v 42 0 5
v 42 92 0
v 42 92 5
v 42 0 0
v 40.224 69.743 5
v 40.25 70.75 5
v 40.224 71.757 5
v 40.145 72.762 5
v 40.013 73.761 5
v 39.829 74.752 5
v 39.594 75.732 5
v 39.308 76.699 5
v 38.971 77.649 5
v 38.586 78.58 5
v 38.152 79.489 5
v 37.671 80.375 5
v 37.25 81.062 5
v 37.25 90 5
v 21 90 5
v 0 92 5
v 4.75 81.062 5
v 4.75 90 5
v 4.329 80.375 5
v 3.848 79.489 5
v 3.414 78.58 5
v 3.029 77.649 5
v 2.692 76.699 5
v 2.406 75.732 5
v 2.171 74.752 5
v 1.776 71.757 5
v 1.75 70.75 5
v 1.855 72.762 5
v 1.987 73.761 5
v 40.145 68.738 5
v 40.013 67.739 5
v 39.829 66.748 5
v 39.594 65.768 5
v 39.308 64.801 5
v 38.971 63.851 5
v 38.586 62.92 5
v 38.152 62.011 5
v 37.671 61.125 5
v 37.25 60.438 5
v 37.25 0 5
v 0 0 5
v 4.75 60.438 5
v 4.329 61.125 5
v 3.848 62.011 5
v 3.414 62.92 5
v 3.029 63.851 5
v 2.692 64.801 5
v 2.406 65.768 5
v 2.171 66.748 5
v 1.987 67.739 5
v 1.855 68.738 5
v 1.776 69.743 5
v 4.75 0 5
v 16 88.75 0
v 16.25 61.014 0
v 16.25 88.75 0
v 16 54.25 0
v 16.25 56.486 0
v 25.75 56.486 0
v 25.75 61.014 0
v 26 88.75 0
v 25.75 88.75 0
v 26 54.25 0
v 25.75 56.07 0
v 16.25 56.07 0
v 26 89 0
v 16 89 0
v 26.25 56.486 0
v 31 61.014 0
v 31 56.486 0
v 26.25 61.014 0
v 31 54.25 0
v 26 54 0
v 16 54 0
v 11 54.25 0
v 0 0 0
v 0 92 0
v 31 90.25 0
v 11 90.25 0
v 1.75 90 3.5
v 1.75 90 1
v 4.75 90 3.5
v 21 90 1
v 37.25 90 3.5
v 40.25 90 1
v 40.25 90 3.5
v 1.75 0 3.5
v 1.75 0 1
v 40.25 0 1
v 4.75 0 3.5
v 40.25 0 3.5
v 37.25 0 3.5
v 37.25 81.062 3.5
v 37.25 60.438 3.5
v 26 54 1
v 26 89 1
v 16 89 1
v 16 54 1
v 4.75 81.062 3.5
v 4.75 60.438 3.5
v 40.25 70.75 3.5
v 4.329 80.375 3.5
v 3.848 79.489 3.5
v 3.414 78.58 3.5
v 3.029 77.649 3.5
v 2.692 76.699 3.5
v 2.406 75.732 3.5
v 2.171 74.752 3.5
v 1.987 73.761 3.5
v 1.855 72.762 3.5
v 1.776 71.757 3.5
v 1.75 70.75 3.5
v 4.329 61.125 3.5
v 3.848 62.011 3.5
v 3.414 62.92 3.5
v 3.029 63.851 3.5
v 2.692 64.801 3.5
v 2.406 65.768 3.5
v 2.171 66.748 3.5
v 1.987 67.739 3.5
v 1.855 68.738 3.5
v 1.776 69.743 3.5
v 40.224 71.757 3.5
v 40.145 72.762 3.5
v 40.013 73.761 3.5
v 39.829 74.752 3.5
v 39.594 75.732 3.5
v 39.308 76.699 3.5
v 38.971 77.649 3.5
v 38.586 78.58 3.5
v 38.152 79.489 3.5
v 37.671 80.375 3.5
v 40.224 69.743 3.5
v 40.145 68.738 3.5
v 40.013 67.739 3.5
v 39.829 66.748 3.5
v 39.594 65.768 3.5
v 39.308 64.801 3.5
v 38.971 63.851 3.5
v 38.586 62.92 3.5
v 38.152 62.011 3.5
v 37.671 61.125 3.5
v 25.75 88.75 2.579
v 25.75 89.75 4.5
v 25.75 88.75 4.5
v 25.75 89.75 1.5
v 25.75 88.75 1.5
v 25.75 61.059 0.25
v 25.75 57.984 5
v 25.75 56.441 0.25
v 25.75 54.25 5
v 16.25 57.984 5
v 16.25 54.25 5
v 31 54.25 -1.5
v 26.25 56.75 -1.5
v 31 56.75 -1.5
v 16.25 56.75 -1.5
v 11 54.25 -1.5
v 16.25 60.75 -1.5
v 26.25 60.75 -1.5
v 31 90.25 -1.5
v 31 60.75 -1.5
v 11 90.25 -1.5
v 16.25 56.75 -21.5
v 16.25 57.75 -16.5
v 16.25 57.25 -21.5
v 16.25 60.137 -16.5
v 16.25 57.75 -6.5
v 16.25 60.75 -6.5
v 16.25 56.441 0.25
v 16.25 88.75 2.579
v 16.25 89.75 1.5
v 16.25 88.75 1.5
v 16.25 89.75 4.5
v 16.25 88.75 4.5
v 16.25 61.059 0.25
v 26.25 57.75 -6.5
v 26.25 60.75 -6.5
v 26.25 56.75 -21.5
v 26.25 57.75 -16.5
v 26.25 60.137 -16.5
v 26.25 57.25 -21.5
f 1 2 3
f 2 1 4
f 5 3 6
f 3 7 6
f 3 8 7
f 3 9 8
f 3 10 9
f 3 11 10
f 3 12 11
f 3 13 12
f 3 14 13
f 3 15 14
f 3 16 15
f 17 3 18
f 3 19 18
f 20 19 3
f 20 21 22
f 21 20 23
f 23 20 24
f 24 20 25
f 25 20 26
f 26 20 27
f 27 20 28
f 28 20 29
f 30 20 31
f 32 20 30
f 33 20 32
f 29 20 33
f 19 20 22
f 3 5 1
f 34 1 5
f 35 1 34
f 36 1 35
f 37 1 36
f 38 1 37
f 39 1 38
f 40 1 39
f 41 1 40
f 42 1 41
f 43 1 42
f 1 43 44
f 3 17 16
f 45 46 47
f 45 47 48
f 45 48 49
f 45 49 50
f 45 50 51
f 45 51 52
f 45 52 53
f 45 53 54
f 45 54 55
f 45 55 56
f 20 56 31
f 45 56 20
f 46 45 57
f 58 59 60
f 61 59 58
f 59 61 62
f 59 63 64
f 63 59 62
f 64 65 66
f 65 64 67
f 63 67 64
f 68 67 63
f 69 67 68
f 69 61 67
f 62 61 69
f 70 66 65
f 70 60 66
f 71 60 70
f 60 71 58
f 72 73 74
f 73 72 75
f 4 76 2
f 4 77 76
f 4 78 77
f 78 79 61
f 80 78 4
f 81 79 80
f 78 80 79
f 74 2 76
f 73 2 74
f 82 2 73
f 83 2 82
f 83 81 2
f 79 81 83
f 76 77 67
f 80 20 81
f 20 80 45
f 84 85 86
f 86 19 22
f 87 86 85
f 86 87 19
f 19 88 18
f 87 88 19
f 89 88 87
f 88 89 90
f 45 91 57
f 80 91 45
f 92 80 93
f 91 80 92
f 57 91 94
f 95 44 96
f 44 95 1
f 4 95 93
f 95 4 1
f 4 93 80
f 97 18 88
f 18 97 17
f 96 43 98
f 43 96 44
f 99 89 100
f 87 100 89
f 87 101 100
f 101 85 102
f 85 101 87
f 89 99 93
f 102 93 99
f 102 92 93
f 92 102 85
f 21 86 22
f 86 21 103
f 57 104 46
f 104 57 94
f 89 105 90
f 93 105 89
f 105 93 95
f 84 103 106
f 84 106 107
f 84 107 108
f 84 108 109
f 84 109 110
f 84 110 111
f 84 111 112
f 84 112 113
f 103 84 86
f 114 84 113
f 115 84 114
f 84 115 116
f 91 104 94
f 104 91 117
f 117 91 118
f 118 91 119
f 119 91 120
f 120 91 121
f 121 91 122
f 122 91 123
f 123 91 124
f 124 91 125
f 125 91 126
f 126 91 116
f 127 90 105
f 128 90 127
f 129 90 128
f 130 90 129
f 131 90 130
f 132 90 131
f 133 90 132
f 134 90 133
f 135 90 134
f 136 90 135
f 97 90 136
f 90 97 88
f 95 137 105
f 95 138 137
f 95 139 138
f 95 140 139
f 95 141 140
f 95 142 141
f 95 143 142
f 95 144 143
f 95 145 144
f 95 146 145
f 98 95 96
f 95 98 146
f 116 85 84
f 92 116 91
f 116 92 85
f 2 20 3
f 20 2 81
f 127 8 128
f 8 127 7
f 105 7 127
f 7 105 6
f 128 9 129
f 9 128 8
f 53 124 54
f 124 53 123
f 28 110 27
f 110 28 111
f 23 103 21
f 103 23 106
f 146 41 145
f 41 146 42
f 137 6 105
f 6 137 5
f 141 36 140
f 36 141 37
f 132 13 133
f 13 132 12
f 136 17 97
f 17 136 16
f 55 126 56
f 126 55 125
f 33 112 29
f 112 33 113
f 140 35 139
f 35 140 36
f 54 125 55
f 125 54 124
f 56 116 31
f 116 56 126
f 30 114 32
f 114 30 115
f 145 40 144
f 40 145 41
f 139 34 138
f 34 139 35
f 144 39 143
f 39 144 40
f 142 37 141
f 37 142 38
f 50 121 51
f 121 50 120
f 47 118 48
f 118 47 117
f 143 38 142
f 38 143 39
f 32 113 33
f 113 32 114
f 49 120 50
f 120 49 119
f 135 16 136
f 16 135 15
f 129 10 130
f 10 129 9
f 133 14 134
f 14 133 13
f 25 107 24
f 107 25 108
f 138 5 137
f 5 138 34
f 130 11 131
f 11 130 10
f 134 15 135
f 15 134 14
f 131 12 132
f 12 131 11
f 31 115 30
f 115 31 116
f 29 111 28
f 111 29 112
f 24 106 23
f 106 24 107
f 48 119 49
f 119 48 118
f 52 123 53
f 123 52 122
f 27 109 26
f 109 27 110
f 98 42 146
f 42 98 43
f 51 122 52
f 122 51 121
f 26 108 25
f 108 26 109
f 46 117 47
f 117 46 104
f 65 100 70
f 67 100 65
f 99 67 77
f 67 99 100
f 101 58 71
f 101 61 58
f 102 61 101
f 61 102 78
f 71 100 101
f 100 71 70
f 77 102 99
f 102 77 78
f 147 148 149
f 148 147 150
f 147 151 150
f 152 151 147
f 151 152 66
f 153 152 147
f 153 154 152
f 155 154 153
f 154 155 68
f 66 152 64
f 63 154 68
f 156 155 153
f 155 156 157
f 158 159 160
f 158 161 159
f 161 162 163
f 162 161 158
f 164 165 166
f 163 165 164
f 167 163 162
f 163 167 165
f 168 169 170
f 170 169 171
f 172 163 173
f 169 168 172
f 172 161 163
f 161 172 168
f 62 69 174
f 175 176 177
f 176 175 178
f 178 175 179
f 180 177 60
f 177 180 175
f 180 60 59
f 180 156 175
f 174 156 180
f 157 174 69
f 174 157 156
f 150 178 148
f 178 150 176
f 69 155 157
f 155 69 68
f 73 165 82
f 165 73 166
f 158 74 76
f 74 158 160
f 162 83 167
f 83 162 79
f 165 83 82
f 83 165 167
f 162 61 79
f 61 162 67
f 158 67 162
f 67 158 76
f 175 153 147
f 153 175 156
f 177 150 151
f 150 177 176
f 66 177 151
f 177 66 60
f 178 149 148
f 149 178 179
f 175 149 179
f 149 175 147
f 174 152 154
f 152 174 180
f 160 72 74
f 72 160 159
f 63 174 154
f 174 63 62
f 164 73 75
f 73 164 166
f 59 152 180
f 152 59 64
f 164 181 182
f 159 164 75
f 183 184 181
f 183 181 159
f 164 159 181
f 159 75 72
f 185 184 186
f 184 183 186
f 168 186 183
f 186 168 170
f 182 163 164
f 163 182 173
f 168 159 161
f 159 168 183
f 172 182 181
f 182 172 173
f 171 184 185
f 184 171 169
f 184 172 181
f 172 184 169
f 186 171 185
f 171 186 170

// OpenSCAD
$fn = 120;

union() {
	difference() {
		union() {
			difference() {
				cube(size = [42, 90, 5]);
				translate(v = [4.75, -1, 1.0]) {
					cube(size = [32.5, 92, 5]);
				}
				translate(v = [1.75, -1, 1.0]) {
					cube(size = [38.5, 92, 2.5]);
				}
			}
			translate(v = [0, 90, 0]) {
				cube(size = [42, 2, 5]);
			}
		}
		translate(v = [21.0, 70.75, 1.0]) {
			cylinder(d = 38.5, h = 5.5);
		}
		translate(v = [16.0, 54, -1]) {
			cube(size = [10, 35.0, 10]);
		}
	}
	translate(v = [16.25, 54.25, -1.5]) {
		union() {
			difference() {
				union() {
					difference() {
						union() {
							difference() {
								cube(size = [9.5, 35.5, 6.5]);
								translate(v = [0, 0, 6.5]) {
									rotate(a = [20, 0, 0]) {
										translate(v = [-0.25, -7.2, -6.5]) {
											cube(size = [10, 7.2, 6.5]);
										}
									}
								}
							}
							translate(v = [-5.25, 0, 0]) {
								cube(size = [20, 36, 1.5]);
							}
						}
						translate(v = [-0.25, 35.5, 4.0]) {
							rotate(a = [-4.5, 0, 0]) {
								translate(v = [0, -35.5, 0]) {
									cube(size = [10, 35.5, 5]);
								}
							}
						}
						translate(v = [-0.25, 34.5, 1.5]) {
							cube(size = [10, 1.5, 1.5]);
						}
					}
					translate(v = [0, 34.5, 3.0]) {
						cube(size = [9.5, 1.0, 3.0]);
					}
				}
				translate(v = [0, 2.5, 0]) {
					difference() {
						translate(v = [0, -1, -0.25]) {
							cube(size = [15, 6, 2.0]);
						}
						rotate(a = [10, 0, 0]) {
							translate(v = [-0.25, -2, 0]) {
								cube(size = [15.5, 2, 2]);
							}
						}
						translate(v = [-0.25, 4, 0]) {
							rotate(a = [-10, 0, 0]) {
								cube(size = [15.5, 2, 2]);
							}
						}
					}
				}
			}
			translate(v = [0, 2.5, -20]) {
				union() {
					difference() {
						cube(size = [10, 4, 20.5]);
						translate(v = [-0.25, 1, 5]) {
							cube(size = [10.5, 10, 10]);
						}
						translate(v = [-0.25, 0.5, 0]) {
							rotate(a = [-30, 0, 0]) {
								cube(size = [10.5, 5, 10]);
							}
						}
					}
					translate(v = [0, 0, 20]) {
						difference() {
							translate(v = [0, -1, -0.0]) {
								cube(size = [10, 6, 1.5]);
							}
							rotate(a = [10, 0, 0]) {
								translate(v = [-0.25, -2, 0]) {
									cube(size = [10.5, 2, 2]);
								}
							}
							translate(v = [-0.25, 4, 0]) {
								rotate(a = [-10, 0, 0]) {
									cube(size = [10.5, 2, 2]);
								}
							}
						}
					}
				}
			}
		}
	}
}
